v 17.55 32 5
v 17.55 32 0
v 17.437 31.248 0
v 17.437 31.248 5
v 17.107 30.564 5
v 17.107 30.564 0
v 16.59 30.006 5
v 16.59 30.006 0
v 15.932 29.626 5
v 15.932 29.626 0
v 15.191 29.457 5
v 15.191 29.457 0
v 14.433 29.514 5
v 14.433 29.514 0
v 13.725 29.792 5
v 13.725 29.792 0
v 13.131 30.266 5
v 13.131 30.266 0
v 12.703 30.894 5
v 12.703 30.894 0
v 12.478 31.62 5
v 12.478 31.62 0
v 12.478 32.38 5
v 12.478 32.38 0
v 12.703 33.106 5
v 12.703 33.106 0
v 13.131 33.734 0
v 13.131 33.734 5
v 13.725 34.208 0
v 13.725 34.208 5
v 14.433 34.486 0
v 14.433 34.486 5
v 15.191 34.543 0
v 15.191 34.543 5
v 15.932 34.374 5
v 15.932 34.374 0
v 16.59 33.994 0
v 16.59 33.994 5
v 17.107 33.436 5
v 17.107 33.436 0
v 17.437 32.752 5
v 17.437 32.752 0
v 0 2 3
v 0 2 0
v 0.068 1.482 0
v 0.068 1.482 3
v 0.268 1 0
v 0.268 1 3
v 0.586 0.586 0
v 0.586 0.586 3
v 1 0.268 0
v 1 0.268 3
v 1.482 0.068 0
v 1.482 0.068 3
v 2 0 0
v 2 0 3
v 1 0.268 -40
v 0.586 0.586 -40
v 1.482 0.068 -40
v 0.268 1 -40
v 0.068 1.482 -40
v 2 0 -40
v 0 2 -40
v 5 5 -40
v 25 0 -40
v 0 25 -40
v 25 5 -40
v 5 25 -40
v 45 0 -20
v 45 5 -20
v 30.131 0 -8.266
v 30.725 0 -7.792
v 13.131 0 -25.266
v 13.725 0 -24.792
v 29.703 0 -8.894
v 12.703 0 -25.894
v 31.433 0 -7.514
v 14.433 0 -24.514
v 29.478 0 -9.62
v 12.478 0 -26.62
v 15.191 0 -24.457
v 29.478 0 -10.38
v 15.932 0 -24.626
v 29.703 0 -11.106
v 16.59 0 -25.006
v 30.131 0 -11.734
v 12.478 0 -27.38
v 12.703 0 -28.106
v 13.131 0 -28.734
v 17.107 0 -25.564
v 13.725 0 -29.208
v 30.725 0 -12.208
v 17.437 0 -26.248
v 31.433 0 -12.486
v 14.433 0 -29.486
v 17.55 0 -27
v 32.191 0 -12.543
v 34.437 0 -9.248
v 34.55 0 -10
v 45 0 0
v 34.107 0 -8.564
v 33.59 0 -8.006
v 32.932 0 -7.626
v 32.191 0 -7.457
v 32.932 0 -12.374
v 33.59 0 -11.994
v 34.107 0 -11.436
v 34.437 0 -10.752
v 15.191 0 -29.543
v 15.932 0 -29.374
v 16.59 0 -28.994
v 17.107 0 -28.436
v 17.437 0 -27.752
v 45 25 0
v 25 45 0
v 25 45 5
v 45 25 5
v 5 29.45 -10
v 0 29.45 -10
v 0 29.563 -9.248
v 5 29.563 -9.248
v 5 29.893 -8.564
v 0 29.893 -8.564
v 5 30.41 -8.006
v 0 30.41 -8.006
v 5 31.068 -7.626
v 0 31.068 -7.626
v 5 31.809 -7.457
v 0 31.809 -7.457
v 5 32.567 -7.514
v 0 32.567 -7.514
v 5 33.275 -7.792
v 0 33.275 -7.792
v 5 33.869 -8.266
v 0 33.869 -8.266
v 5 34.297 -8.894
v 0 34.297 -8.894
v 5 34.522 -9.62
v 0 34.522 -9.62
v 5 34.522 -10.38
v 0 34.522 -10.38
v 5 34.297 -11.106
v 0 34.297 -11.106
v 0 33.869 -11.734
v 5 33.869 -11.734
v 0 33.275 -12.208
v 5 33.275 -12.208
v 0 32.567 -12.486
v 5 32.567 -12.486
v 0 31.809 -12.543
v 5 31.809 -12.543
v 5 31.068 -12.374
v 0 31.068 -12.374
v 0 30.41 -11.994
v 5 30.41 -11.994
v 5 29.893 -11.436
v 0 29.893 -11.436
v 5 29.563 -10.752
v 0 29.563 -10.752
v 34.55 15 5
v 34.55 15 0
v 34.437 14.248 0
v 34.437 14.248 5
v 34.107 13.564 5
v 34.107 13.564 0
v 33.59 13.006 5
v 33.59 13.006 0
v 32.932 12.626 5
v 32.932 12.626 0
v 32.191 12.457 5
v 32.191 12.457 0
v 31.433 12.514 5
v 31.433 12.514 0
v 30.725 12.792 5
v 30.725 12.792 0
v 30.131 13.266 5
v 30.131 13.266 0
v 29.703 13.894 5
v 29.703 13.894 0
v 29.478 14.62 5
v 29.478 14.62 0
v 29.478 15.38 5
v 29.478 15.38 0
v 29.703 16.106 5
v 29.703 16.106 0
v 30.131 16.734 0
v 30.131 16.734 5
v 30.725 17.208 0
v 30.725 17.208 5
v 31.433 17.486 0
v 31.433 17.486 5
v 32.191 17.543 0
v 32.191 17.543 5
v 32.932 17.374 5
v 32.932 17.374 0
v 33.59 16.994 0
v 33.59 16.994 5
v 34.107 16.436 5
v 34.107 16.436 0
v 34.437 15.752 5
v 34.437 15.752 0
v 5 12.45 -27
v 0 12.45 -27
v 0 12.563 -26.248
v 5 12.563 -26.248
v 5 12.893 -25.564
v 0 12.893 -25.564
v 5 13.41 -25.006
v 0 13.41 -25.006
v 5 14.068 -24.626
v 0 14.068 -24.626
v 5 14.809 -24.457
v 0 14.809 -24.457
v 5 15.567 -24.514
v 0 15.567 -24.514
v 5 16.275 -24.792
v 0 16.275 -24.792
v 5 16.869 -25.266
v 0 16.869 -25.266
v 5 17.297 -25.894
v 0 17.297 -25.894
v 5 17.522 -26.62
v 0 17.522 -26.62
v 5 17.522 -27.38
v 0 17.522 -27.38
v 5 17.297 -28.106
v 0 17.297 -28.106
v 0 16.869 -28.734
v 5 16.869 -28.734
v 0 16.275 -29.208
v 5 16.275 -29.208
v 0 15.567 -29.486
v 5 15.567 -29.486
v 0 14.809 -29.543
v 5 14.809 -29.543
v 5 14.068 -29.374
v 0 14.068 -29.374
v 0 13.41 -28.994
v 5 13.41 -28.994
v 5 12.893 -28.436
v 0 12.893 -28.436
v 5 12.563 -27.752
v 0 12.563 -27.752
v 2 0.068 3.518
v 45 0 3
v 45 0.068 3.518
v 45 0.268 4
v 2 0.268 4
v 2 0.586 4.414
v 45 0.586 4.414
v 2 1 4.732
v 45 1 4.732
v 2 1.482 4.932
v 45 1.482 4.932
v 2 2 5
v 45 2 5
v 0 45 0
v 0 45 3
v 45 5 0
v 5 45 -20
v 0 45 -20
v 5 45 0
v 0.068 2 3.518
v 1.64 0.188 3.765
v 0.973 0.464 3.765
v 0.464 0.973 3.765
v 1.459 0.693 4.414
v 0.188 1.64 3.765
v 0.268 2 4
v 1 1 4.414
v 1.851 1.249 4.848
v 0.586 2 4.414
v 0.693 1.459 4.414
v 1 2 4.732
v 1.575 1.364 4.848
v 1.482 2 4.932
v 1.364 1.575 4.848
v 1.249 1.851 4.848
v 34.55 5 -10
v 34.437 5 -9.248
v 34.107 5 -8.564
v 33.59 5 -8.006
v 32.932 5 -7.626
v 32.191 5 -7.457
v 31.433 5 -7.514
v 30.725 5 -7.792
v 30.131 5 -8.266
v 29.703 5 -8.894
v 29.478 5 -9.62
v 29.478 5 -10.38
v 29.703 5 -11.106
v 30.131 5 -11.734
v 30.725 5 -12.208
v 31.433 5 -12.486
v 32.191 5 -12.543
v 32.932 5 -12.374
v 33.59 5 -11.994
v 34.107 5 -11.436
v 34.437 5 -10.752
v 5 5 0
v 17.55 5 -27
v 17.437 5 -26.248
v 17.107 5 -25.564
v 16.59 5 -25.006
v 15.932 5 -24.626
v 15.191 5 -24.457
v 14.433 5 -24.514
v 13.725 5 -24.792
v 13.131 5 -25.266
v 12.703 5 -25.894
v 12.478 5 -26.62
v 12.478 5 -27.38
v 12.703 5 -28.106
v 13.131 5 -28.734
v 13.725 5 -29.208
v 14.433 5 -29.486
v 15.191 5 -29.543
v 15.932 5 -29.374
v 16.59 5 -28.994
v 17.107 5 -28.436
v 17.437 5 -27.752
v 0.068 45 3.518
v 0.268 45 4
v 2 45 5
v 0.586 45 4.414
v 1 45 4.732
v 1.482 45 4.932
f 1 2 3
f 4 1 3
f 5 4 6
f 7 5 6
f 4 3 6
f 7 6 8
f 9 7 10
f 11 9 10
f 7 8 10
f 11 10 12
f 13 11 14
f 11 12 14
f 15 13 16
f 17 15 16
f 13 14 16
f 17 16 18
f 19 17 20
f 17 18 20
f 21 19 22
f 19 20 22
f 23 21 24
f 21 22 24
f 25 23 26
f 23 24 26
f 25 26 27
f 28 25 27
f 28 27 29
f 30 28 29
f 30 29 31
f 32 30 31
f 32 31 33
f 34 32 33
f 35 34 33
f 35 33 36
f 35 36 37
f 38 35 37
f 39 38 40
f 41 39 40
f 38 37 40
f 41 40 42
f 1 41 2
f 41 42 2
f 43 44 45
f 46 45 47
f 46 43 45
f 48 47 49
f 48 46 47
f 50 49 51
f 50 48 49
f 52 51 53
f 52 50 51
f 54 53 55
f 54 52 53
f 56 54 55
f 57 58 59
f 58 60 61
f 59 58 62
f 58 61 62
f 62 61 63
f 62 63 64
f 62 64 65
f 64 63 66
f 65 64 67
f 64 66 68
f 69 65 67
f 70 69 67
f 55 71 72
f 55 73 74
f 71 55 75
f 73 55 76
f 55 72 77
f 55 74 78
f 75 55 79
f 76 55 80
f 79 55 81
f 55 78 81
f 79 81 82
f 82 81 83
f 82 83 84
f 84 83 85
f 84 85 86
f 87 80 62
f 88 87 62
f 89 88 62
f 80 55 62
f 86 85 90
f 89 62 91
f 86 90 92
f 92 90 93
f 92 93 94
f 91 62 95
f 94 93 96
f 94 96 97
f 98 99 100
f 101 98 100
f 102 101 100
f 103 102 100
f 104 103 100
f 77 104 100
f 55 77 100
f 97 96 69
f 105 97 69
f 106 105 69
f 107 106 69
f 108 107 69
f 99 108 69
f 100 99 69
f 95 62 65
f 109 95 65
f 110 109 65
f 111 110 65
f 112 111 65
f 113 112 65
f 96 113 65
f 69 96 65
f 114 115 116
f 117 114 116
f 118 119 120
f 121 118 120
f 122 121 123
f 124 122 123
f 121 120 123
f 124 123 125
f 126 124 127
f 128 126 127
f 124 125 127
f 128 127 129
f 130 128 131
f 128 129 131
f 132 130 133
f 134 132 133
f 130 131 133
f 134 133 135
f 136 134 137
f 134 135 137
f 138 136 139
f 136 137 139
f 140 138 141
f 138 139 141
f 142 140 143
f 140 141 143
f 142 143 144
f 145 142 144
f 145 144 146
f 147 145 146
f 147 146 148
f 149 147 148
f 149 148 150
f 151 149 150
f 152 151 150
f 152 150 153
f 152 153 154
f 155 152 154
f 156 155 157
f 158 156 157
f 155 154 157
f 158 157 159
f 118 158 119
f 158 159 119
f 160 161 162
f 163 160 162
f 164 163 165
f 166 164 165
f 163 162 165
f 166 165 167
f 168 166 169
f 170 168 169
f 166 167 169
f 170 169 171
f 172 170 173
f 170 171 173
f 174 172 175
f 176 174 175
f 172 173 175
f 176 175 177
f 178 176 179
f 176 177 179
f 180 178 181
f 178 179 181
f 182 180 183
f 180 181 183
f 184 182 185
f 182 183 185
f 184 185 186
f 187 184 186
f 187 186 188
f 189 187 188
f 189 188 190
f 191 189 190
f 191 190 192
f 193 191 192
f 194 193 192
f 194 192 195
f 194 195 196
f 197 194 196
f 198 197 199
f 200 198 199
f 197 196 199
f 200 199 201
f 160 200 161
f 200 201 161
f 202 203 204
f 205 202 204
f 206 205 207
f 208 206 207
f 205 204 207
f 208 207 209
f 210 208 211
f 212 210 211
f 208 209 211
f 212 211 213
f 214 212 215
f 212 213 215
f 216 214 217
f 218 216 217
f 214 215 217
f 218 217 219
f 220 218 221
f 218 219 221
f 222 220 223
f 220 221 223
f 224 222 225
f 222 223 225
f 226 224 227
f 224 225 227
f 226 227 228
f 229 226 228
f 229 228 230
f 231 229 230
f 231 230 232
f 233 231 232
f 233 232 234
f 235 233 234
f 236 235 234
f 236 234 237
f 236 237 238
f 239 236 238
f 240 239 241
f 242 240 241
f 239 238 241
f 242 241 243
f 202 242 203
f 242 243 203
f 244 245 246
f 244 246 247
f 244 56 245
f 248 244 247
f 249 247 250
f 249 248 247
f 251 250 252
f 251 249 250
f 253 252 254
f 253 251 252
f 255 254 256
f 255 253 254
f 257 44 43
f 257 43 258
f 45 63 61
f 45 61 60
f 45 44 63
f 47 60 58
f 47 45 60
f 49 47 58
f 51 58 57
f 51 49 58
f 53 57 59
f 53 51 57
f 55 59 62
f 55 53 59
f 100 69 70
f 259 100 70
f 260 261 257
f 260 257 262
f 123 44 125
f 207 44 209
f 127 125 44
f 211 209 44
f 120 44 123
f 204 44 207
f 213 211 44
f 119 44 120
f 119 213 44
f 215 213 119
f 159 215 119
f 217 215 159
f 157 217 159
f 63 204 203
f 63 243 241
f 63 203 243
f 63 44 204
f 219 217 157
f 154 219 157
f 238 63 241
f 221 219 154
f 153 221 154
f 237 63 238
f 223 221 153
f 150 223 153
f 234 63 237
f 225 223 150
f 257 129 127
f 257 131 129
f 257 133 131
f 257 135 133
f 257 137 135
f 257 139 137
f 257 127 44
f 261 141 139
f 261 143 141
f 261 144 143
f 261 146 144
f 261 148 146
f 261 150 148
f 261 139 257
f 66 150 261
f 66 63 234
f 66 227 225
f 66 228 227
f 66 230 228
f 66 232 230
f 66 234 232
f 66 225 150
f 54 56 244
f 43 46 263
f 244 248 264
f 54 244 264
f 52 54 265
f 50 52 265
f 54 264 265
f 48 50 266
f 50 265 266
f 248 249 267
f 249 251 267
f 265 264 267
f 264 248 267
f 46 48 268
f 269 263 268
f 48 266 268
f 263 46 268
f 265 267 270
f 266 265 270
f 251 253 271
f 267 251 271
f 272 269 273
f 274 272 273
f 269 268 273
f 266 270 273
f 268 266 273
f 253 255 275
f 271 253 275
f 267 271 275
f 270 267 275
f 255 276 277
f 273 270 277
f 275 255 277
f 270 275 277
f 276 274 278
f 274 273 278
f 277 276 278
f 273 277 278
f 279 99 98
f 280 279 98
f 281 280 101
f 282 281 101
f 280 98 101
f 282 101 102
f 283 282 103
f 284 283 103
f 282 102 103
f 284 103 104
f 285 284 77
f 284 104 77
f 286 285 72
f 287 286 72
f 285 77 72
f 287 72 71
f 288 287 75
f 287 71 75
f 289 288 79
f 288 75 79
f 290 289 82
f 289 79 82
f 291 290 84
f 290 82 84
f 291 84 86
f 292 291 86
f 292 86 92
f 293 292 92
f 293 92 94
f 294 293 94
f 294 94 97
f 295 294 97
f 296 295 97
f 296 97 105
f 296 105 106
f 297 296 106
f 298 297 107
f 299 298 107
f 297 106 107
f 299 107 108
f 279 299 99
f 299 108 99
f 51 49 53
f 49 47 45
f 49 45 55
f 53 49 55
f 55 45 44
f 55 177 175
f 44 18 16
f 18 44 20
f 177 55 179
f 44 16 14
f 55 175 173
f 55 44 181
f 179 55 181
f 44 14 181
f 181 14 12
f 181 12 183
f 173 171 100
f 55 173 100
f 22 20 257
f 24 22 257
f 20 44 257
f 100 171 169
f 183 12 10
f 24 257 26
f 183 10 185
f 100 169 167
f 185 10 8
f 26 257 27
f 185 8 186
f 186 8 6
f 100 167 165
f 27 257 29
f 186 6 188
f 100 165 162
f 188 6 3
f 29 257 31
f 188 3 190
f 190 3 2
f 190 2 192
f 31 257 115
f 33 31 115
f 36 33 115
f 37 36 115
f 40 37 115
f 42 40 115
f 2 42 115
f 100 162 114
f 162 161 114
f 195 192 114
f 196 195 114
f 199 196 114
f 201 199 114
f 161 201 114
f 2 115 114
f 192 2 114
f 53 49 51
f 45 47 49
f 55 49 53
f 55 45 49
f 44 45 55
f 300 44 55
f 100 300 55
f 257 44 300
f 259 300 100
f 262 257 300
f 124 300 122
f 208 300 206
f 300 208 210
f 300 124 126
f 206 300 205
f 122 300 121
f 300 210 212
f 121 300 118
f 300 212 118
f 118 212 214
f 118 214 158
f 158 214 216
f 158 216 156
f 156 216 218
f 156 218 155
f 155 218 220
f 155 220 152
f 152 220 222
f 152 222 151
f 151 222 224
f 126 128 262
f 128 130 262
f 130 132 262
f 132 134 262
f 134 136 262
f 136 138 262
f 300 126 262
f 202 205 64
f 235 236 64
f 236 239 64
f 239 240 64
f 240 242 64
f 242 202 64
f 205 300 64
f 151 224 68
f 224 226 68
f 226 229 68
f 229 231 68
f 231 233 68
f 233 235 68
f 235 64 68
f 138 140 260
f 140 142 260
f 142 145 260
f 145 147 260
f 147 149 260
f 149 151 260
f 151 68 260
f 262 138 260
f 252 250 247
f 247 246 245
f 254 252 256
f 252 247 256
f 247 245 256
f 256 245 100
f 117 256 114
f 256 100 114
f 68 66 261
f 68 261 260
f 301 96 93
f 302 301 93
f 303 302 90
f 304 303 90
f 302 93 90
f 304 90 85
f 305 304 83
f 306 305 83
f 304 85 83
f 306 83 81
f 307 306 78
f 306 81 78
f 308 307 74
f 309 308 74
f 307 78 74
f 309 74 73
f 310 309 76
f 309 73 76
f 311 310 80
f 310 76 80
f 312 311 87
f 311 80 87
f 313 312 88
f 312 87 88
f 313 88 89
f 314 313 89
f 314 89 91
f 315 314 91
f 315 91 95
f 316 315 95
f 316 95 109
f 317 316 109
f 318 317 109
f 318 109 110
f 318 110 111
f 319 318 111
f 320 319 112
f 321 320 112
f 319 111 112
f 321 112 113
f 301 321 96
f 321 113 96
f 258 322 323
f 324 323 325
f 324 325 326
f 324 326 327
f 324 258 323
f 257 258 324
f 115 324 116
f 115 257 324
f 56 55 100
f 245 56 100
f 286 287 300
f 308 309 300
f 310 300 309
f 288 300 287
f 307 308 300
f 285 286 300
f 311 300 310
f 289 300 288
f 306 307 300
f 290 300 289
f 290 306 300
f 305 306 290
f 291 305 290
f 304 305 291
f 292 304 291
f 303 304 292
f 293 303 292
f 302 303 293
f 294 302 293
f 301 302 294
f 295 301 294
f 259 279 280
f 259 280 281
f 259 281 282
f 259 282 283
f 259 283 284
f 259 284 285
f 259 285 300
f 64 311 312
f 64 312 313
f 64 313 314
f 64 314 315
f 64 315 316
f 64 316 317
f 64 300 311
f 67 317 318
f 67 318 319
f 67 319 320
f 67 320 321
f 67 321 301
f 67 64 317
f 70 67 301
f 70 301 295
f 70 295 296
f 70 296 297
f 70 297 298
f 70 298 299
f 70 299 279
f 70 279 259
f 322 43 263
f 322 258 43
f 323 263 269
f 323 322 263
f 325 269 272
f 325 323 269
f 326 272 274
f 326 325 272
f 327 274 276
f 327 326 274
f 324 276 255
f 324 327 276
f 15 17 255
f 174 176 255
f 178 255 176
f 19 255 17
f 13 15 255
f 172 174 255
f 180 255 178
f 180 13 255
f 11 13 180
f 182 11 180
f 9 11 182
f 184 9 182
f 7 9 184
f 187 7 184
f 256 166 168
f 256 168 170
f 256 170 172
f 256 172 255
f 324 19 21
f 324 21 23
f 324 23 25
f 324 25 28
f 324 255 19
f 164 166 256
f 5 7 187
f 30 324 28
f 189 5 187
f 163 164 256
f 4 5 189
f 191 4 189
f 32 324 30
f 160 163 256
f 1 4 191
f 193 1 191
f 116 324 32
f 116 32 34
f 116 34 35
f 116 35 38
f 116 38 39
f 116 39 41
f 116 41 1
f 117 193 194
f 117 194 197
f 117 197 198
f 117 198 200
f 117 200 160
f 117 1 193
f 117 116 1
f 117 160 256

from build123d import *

# Parameters (mm, degrees)
BOX_W           = 45
BOX_H           = 45
BOX_DEPTH       = 5
SKETCH001_R     = 2.55
POCKET_DEPTH    = 5
FILLET_R        = 2
FILLET001_R     = 2
CHAMFER_SIZE    = 20
BOX002_W        = 45
BOX002_H        = 45
BOX002_DEPTH    = 40
BOX001_W        = 45
BOX001_H        = 45
BOX001_DEPTH    = 40
FILLET002_R     = 2
CHAMFER001_SIZE = 20
SKETCH_R        = 2.55
POCKET001_DEPTH = 5
SKETCH002_R     = 2.55
POCKET002_DEPTH = 5


with BuildPart() as chamfer_body:
    # Box → Box (new body)
    with BuildSketch(Plane.XY):
        with Locations((22.5, 22.5)):
            Rectangle(BOX_W, BOX_H)
    extrude(amount=BOX_DEPTH)

    # Sketch001 → Pocket (cut)
    with BuildSketch(Plane(origin=(0, 0, 0), x_dir=(1, 0, 0), z_dir=(0, 0, -1))):
        with Locations((15, -32)):
            Circle(SKETCH001_R)
        with Locations((32, -15)):
            Circle(SKETCH001_R)
    extrude(amount=-POCKET_DEPTH, mode=Mode.SUBTRACT)

    # Fillet
    fillet_edges = [chamfer_body.edges().sort_by_distance(p)[0] for p in [
        (0, 0, 2.5),
    ]]
    fillet(fillet_edges, radius=FILLET_R)

    # Fillet001
    fillet001_edges = [chamfer_body.edges().sort_by_distance(p)[0] for p in [
        (0, 23.5, 5),
        (0.585786, 0.585786, 5),
        (23.5, 0, 5),
    ]]
    fillet(fillet001_edges, radius=FILLET001_R)

    # Chamfer
    chamfer_edges = [chamfer_body.edges().sort_by_distance(p)[0] for p in [
        (45, 45, 2.5),
    ]]
    chamfer(chamfer_edges, length=CHAMFER_SIZE)


with BuildPart() as cube002:
    # Box002 → Box002 (new body)
    with BuildSketch(Plane(origin=(5, 5, -40), x_dir=(1, 0, 0), z_dir=(0, 0, 1))):
        with Locations((22.5, 22.5)):
            Rectangle(BOX002_W, BOX002_H)
    extrude(amount=BOX002_DEPTH)


with BuildPart() as pocket002:
    # Box001 → Box001 (new body)
    with BuildSketch(Plane.XY.offset(-40)):
        with Locations((22.5, 22.5)):
            Rectangle(BOX001_W, BOX001_H)
    extrude(amount=BOX001_DEPTH)

    # Cut: cut Cube002
    add(cube002.part, mode=Mode.SUBTRACT)

    # Fillet002
    fillet002_edges = [pocket002.edges().sort_by_distance(p)[0] for p in [
        (0, 0, -20),
    ]]
    fillet(fillet002_edges, radius=FILLET002_R)

    # Chamfer001
    chamfer001_edges = [pocket002.edges().sort_by_distance(p)[0] for p in [
        (45, 2.5, -40),
        (2.5, 45, -40),
    ]]
    chamfer(chamfer001_edges, length=CHAMFER001_SIZE)

    # Sketch → Pocket001 (cut)
    with BuildSketch(Plane.XZ):
        with Locations((32, -10)):
            Circle(SKETCH_R)
        with Locations((15, -27)):
            Circle(SKETCH_R)
    extrude(amount=-POCKET001_DEPTH, mode=Mode.SUBTRACT)

    # Sketch002 → Pocket002 (cut)
    with BuildSketch(Plane(origin=(0, 0, 0), x_dir=(0, -1, 0), z_dir=(-1, 0, 0))):
        with Locations((-32, -10)):
            Circle(SKETCH002_R)
        with Locations((-15, -27)):
            Circle(SKETCH002_R)
    extrude(amount=-POCKET002_DEPTH, mode=Mode.SUBTRACT)


solid = Compound([chamfer_body.part, pocket002.part])
